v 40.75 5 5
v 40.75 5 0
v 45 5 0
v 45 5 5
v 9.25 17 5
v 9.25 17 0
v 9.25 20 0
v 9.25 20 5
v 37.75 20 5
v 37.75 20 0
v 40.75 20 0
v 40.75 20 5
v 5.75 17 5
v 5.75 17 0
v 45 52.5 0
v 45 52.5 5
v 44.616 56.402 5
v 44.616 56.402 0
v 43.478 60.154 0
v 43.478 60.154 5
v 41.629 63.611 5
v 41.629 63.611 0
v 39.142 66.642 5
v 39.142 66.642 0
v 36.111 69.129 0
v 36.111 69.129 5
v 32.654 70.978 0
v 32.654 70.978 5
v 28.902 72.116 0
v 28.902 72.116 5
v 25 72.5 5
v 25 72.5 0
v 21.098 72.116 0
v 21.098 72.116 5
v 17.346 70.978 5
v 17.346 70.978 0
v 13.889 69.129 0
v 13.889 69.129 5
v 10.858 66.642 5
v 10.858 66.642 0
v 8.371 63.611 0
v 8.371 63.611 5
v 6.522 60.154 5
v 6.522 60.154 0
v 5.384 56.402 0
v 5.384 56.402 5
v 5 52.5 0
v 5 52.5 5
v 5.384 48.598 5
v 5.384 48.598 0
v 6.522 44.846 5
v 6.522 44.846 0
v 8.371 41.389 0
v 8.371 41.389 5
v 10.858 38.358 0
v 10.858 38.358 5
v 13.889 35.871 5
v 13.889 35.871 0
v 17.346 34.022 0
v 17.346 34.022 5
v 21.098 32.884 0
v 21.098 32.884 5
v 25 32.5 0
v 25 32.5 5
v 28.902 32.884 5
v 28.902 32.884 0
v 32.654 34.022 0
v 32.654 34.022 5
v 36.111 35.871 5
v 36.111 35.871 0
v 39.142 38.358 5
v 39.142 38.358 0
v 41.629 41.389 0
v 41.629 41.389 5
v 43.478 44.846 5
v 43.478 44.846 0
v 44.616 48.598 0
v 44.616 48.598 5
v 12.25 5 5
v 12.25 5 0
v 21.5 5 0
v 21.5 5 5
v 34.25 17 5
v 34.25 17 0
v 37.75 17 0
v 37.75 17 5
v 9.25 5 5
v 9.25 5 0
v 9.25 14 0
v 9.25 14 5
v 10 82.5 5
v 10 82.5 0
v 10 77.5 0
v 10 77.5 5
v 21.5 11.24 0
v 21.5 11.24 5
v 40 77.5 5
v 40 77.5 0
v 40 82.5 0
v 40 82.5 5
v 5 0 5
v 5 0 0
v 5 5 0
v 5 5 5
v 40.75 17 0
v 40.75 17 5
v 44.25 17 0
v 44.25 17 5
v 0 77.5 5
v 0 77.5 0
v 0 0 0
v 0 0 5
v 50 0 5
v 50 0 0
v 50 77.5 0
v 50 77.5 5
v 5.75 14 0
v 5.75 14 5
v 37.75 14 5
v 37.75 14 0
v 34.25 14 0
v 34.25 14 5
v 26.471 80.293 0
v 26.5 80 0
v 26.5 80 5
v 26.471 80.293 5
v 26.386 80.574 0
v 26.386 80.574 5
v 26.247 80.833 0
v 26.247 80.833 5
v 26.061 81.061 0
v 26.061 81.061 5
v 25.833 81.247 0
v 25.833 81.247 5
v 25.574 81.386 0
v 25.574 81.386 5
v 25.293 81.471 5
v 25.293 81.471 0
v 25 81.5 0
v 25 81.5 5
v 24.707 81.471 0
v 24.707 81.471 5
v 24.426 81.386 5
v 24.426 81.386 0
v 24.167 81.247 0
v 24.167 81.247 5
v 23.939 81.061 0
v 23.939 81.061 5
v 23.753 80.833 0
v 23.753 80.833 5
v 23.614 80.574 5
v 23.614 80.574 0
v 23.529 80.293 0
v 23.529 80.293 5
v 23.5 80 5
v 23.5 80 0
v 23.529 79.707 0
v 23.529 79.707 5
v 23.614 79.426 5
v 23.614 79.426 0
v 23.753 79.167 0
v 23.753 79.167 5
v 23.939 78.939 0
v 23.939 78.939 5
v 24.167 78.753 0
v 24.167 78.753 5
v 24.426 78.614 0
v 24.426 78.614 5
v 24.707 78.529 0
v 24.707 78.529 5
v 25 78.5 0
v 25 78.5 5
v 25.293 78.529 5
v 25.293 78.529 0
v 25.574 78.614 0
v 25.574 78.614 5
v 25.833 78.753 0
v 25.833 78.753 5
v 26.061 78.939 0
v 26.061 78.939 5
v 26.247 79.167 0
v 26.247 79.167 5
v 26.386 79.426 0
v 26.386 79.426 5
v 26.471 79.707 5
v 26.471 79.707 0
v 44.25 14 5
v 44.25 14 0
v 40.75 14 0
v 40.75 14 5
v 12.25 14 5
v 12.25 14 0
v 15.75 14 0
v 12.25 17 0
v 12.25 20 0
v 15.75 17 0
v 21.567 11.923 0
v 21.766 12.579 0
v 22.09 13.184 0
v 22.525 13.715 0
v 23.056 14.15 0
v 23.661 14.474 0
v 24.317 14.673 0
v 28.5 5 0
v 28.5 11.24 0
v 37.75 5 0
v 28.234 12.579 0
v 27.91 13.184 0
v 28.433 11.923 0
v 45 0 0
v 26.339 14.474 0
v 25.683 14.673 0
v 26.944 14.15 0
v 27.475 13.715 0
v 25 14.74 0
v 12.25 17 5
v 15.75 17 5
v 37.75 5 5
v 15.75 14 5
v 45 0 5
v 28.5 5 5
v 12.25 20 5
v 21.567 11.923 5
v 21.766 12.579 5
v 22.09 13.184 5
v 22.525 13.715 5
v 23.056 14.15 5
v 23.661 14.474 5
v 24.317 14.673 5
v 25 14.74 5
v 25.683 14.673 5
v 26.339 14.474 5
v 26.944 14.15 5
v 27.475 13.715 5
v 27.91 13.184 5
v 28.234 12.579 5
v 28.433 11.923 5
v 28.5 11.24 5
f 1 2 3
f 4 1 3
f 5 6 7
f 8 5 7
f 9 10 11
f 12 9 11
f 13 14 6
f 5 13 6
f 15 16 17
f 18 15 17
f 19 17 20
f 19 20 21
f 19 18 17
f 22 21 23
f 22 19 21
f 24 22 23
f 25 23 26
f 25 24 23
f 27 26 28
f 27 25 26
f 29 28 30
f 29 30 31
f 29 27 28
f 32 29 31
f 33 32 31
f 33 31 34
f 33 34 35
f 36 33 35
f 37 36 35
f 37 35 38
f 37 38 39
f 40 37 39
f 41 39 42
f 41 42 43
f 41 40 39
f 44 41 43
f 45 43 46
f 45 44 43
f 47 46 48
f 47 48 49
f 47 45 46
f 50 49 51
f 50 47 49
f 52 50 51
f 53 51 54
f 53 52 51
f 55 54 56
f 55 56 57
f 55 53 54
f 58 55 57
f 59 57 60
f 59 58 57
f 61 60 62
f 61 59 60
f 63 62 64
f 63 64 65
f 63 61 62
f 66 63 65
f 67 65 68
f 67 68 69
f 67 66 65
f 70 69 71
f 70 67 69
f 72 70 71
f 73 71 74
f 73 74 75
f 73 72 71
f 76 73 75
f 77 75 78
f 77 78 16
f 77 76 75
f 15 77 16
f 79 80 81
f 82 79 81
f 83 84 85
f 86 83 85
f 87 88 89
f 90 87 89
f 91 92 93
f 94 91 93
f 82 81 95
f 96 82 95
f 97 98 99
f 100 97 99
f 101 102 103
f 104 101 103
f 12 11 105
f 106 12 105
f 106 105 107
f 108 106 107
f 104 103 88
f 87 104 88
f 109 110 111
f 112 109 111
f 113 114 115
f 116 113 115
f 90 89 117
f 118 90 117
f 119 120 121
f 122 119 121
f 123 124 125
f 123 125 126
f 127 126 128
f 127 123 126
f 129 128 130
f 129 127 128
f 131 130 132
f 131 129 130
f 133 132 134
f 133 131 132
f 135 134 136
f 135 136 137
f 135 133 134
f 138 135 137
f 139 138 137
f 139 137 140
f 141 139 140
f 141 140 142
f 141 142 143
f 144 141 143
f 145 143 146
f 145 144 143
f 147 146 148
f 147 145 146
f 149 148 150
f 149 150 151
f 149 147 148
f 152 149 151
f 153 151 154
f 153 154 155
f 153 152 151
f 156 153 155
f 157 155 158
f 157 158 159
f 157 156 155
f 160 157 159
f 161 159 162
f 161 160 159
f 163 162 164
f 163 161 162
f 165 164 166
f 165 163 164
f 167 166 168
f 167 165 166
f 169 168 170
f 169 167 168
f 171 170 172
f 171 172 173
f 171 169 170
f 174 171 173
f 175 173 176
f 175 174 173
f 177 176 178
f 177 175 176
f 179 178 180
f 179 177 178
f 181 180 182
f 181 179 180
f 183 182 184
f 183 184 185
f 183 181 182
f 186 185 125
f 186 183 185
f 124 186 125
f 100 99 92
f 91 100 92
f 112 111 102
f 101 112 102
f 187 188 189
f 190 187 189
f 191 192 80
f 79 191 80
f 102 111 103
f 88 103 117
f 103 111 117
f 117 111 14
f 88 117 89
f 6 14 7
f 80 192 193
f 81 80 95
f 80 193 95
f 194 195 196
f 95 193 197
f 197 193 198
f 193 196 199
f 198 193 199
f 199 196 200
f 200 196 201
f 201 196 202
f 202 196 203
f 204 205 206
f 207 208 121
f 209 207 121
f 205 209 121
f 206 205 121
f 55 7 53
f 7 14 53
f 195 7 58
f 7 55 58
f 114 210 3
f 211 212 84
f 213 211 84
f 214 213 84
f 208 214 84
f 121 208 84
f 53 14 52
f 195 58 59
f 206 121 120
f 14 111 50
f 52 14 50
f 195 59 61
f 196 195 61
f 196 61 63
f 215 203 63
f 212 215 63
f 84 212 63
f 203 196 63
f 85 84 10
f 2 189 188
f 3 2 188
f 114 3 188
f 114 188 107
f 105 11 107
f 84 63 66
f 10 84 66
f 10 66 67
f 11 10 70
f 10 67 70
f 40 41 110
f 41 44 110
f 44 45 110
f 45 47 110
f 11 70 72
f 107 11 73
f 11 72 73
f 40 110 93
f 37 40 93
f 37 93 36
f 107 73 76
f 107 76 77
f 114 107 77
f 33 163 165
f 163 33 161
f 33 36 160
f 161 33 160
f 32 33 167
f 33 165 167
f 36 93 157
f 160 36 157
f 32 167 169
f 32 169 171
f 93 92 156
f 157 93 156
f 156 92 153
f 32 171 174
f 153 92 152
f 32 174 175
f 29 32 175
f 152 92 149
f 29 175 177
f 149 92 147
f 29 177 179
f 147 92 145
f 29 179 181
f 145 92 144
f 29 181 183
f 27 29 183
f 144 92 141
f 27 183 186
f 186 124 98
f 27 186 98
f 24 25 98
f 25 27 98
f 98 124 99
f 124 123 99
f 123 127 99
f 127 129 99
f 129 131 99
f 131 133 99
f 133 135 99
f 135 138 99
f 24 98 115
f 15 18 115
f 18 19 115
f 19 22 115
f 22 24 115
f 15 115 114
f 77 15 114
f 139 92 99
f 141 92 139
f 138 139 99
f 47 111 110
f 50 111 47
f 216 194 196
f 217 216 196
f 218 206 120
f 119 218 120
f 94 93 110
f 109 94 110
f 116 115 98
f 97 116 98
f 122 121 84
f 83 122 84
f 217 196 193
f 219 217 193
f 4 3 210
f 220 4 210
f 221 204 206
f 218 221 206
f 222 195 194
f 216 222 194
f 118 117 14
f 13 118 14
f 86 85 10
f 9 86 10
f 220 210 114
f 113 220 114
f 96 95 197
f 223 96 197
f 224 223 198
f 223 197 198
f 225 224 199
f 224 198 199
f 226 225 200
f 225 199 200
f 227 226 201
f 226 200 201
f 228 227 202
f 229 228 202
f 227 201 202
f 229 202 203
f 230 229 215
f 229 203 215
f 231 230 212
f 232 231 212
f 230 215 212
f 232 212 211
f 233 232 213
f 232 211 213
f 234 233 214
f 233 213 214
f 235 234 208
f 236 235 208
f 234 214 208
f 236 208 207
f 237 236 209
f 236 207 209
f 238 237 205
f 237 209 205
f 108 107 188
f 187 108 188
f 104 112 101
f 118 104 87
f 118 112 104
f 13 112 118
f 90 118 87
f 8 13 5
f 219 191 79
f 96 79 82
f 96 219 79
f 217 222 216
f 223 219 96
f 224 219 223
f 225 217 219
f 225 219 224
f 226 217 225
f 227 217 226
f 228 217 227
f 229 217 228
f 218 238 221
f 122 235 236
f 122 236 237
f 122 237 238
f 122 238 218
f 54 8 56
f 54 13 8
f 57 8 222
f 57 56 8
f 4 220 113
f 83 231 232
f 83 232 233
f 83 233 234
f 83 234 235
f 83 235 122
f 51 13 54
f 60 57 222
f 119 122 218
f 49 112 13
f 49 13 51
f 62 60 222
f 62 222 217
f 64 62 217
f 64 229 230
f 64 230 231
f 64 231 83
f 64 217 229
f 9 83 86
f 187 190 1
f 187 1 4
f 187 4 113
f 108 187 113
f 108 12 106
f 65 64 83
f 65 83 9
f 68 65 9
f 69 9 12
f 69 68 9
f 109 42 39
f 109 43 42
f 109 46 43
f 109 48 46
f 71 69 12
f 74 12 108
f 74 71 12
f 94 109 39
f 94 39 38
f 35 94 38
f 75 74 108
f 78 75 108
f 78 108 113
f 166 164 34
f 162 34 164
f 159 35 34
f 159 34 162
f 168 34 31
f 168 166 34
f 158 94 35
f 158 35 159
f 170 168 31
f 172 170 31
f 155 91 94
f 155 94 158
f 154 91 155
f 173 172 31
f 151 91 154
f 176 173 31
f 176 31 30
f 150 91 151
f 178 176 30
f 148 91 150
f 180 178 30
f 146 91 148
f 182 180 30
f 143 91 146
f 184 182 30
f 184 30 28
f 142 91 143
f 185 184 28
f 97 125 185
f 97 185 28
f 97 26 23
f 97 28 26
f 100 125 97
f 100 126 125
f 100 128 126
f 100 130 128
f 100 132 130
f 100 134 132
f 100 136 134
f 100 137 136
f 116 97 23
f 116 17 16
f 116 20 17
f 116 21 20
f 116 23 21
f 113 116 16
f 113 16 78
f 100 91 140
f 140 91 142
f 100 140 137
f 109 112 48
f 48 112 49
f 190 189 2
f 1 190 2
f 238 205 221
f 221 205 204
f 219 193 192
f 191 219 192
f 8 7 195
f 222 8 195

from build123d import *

# Parameters (mm, degrees)
CROQUIS1_R              = 1.5
CROQUIS1_R_2            = 20
SALIENTE_EXTRUIR1_DEPTH = 5


with BuildPart() as part:
    # Croquis1 → Saliente-Extruir1 (new body)
    with BuildSketch(Plane.XY):
        with BuildLine():
            Line((0, 0), (5, 0))
            Line((5, 0), (5, 5))
            Line((5, 5), (9.25, 5))
            Line((9.25, 5), (9.25, 14))
            Line((9.25, 14), (5.75, 14))
            Line((5.75, 14), (5.75, 17))
            Line((5.75, 17), (9.25, 17))
            Line((9.25, 17), (9.25, 20))
            Line((9.25, 20), (12.25, 20))
            Line((12.25, 20), (12.25, 17))
            Line((12.25, 17), (15.75, 17))
            Line((15.75, 17), (15.75, 14))
            Line((15.75, 14), (12.25, 14))
            Line((12.25, 14), (12.25, 5))
            Line((12.25, 5), (21.5, 5))
            Line((21.5, 5), (21.5, 11.24))
            ThreePointArc((21.5, 11.24), (25, 14.74), (28.5, 11.24))
            Line((28.5, 11.24), (28.5, 5))
            Line((28.5, 5), (37.75, 5))
            Line((37.75, 5), (37.75, 14))
            Line((37.75, 14), (34.25, 14))
            Line((34.25, 14), (34.25, 17))
            Line((34.25, 17), (37.75, 17))
            Line((37.75, 17), (37.75, 20))
            Line((37.75, 20), (40.75, 20))
            Line((40.75, 20), (40.75, 17))
            Line((40.75, 17), (44.25, 17))
            Line((44.25, 17), (44.25, 14))
            Line((44.25, 14), (40.75, 14))
            Line((40.75, 14), (40.75, 5))
            Line((40.75, 5), (45, 5))
            Line((45, 5), (45, 0))
            Line((45, 0), (50, 0))
            Line((50, 0), (50, 77.5))
            Line((50, 77.5), (40, 77.5))
            Line((40, 77.5), (40, 82.5))
            Line((40, 82.5), (10, 82.5))
            Line((10, 82.5), (10, 77.5))
            Line((10, 77.5), (0, 77.5))
            Line((0, 77.5), (0, 0))
        make_face()
        with Locations((25, 80)):
            Circle(CROQUIS1_R, mode=Mode.SUBTRACT)
        with Locations((25, 52.5)):
            Circle(CROQUIS1_R_2, mode=Mode.SUBTRACT)
    extrude(amount=SALIENTE_EXTRUIR1_DEPTH)


solid = part.part
